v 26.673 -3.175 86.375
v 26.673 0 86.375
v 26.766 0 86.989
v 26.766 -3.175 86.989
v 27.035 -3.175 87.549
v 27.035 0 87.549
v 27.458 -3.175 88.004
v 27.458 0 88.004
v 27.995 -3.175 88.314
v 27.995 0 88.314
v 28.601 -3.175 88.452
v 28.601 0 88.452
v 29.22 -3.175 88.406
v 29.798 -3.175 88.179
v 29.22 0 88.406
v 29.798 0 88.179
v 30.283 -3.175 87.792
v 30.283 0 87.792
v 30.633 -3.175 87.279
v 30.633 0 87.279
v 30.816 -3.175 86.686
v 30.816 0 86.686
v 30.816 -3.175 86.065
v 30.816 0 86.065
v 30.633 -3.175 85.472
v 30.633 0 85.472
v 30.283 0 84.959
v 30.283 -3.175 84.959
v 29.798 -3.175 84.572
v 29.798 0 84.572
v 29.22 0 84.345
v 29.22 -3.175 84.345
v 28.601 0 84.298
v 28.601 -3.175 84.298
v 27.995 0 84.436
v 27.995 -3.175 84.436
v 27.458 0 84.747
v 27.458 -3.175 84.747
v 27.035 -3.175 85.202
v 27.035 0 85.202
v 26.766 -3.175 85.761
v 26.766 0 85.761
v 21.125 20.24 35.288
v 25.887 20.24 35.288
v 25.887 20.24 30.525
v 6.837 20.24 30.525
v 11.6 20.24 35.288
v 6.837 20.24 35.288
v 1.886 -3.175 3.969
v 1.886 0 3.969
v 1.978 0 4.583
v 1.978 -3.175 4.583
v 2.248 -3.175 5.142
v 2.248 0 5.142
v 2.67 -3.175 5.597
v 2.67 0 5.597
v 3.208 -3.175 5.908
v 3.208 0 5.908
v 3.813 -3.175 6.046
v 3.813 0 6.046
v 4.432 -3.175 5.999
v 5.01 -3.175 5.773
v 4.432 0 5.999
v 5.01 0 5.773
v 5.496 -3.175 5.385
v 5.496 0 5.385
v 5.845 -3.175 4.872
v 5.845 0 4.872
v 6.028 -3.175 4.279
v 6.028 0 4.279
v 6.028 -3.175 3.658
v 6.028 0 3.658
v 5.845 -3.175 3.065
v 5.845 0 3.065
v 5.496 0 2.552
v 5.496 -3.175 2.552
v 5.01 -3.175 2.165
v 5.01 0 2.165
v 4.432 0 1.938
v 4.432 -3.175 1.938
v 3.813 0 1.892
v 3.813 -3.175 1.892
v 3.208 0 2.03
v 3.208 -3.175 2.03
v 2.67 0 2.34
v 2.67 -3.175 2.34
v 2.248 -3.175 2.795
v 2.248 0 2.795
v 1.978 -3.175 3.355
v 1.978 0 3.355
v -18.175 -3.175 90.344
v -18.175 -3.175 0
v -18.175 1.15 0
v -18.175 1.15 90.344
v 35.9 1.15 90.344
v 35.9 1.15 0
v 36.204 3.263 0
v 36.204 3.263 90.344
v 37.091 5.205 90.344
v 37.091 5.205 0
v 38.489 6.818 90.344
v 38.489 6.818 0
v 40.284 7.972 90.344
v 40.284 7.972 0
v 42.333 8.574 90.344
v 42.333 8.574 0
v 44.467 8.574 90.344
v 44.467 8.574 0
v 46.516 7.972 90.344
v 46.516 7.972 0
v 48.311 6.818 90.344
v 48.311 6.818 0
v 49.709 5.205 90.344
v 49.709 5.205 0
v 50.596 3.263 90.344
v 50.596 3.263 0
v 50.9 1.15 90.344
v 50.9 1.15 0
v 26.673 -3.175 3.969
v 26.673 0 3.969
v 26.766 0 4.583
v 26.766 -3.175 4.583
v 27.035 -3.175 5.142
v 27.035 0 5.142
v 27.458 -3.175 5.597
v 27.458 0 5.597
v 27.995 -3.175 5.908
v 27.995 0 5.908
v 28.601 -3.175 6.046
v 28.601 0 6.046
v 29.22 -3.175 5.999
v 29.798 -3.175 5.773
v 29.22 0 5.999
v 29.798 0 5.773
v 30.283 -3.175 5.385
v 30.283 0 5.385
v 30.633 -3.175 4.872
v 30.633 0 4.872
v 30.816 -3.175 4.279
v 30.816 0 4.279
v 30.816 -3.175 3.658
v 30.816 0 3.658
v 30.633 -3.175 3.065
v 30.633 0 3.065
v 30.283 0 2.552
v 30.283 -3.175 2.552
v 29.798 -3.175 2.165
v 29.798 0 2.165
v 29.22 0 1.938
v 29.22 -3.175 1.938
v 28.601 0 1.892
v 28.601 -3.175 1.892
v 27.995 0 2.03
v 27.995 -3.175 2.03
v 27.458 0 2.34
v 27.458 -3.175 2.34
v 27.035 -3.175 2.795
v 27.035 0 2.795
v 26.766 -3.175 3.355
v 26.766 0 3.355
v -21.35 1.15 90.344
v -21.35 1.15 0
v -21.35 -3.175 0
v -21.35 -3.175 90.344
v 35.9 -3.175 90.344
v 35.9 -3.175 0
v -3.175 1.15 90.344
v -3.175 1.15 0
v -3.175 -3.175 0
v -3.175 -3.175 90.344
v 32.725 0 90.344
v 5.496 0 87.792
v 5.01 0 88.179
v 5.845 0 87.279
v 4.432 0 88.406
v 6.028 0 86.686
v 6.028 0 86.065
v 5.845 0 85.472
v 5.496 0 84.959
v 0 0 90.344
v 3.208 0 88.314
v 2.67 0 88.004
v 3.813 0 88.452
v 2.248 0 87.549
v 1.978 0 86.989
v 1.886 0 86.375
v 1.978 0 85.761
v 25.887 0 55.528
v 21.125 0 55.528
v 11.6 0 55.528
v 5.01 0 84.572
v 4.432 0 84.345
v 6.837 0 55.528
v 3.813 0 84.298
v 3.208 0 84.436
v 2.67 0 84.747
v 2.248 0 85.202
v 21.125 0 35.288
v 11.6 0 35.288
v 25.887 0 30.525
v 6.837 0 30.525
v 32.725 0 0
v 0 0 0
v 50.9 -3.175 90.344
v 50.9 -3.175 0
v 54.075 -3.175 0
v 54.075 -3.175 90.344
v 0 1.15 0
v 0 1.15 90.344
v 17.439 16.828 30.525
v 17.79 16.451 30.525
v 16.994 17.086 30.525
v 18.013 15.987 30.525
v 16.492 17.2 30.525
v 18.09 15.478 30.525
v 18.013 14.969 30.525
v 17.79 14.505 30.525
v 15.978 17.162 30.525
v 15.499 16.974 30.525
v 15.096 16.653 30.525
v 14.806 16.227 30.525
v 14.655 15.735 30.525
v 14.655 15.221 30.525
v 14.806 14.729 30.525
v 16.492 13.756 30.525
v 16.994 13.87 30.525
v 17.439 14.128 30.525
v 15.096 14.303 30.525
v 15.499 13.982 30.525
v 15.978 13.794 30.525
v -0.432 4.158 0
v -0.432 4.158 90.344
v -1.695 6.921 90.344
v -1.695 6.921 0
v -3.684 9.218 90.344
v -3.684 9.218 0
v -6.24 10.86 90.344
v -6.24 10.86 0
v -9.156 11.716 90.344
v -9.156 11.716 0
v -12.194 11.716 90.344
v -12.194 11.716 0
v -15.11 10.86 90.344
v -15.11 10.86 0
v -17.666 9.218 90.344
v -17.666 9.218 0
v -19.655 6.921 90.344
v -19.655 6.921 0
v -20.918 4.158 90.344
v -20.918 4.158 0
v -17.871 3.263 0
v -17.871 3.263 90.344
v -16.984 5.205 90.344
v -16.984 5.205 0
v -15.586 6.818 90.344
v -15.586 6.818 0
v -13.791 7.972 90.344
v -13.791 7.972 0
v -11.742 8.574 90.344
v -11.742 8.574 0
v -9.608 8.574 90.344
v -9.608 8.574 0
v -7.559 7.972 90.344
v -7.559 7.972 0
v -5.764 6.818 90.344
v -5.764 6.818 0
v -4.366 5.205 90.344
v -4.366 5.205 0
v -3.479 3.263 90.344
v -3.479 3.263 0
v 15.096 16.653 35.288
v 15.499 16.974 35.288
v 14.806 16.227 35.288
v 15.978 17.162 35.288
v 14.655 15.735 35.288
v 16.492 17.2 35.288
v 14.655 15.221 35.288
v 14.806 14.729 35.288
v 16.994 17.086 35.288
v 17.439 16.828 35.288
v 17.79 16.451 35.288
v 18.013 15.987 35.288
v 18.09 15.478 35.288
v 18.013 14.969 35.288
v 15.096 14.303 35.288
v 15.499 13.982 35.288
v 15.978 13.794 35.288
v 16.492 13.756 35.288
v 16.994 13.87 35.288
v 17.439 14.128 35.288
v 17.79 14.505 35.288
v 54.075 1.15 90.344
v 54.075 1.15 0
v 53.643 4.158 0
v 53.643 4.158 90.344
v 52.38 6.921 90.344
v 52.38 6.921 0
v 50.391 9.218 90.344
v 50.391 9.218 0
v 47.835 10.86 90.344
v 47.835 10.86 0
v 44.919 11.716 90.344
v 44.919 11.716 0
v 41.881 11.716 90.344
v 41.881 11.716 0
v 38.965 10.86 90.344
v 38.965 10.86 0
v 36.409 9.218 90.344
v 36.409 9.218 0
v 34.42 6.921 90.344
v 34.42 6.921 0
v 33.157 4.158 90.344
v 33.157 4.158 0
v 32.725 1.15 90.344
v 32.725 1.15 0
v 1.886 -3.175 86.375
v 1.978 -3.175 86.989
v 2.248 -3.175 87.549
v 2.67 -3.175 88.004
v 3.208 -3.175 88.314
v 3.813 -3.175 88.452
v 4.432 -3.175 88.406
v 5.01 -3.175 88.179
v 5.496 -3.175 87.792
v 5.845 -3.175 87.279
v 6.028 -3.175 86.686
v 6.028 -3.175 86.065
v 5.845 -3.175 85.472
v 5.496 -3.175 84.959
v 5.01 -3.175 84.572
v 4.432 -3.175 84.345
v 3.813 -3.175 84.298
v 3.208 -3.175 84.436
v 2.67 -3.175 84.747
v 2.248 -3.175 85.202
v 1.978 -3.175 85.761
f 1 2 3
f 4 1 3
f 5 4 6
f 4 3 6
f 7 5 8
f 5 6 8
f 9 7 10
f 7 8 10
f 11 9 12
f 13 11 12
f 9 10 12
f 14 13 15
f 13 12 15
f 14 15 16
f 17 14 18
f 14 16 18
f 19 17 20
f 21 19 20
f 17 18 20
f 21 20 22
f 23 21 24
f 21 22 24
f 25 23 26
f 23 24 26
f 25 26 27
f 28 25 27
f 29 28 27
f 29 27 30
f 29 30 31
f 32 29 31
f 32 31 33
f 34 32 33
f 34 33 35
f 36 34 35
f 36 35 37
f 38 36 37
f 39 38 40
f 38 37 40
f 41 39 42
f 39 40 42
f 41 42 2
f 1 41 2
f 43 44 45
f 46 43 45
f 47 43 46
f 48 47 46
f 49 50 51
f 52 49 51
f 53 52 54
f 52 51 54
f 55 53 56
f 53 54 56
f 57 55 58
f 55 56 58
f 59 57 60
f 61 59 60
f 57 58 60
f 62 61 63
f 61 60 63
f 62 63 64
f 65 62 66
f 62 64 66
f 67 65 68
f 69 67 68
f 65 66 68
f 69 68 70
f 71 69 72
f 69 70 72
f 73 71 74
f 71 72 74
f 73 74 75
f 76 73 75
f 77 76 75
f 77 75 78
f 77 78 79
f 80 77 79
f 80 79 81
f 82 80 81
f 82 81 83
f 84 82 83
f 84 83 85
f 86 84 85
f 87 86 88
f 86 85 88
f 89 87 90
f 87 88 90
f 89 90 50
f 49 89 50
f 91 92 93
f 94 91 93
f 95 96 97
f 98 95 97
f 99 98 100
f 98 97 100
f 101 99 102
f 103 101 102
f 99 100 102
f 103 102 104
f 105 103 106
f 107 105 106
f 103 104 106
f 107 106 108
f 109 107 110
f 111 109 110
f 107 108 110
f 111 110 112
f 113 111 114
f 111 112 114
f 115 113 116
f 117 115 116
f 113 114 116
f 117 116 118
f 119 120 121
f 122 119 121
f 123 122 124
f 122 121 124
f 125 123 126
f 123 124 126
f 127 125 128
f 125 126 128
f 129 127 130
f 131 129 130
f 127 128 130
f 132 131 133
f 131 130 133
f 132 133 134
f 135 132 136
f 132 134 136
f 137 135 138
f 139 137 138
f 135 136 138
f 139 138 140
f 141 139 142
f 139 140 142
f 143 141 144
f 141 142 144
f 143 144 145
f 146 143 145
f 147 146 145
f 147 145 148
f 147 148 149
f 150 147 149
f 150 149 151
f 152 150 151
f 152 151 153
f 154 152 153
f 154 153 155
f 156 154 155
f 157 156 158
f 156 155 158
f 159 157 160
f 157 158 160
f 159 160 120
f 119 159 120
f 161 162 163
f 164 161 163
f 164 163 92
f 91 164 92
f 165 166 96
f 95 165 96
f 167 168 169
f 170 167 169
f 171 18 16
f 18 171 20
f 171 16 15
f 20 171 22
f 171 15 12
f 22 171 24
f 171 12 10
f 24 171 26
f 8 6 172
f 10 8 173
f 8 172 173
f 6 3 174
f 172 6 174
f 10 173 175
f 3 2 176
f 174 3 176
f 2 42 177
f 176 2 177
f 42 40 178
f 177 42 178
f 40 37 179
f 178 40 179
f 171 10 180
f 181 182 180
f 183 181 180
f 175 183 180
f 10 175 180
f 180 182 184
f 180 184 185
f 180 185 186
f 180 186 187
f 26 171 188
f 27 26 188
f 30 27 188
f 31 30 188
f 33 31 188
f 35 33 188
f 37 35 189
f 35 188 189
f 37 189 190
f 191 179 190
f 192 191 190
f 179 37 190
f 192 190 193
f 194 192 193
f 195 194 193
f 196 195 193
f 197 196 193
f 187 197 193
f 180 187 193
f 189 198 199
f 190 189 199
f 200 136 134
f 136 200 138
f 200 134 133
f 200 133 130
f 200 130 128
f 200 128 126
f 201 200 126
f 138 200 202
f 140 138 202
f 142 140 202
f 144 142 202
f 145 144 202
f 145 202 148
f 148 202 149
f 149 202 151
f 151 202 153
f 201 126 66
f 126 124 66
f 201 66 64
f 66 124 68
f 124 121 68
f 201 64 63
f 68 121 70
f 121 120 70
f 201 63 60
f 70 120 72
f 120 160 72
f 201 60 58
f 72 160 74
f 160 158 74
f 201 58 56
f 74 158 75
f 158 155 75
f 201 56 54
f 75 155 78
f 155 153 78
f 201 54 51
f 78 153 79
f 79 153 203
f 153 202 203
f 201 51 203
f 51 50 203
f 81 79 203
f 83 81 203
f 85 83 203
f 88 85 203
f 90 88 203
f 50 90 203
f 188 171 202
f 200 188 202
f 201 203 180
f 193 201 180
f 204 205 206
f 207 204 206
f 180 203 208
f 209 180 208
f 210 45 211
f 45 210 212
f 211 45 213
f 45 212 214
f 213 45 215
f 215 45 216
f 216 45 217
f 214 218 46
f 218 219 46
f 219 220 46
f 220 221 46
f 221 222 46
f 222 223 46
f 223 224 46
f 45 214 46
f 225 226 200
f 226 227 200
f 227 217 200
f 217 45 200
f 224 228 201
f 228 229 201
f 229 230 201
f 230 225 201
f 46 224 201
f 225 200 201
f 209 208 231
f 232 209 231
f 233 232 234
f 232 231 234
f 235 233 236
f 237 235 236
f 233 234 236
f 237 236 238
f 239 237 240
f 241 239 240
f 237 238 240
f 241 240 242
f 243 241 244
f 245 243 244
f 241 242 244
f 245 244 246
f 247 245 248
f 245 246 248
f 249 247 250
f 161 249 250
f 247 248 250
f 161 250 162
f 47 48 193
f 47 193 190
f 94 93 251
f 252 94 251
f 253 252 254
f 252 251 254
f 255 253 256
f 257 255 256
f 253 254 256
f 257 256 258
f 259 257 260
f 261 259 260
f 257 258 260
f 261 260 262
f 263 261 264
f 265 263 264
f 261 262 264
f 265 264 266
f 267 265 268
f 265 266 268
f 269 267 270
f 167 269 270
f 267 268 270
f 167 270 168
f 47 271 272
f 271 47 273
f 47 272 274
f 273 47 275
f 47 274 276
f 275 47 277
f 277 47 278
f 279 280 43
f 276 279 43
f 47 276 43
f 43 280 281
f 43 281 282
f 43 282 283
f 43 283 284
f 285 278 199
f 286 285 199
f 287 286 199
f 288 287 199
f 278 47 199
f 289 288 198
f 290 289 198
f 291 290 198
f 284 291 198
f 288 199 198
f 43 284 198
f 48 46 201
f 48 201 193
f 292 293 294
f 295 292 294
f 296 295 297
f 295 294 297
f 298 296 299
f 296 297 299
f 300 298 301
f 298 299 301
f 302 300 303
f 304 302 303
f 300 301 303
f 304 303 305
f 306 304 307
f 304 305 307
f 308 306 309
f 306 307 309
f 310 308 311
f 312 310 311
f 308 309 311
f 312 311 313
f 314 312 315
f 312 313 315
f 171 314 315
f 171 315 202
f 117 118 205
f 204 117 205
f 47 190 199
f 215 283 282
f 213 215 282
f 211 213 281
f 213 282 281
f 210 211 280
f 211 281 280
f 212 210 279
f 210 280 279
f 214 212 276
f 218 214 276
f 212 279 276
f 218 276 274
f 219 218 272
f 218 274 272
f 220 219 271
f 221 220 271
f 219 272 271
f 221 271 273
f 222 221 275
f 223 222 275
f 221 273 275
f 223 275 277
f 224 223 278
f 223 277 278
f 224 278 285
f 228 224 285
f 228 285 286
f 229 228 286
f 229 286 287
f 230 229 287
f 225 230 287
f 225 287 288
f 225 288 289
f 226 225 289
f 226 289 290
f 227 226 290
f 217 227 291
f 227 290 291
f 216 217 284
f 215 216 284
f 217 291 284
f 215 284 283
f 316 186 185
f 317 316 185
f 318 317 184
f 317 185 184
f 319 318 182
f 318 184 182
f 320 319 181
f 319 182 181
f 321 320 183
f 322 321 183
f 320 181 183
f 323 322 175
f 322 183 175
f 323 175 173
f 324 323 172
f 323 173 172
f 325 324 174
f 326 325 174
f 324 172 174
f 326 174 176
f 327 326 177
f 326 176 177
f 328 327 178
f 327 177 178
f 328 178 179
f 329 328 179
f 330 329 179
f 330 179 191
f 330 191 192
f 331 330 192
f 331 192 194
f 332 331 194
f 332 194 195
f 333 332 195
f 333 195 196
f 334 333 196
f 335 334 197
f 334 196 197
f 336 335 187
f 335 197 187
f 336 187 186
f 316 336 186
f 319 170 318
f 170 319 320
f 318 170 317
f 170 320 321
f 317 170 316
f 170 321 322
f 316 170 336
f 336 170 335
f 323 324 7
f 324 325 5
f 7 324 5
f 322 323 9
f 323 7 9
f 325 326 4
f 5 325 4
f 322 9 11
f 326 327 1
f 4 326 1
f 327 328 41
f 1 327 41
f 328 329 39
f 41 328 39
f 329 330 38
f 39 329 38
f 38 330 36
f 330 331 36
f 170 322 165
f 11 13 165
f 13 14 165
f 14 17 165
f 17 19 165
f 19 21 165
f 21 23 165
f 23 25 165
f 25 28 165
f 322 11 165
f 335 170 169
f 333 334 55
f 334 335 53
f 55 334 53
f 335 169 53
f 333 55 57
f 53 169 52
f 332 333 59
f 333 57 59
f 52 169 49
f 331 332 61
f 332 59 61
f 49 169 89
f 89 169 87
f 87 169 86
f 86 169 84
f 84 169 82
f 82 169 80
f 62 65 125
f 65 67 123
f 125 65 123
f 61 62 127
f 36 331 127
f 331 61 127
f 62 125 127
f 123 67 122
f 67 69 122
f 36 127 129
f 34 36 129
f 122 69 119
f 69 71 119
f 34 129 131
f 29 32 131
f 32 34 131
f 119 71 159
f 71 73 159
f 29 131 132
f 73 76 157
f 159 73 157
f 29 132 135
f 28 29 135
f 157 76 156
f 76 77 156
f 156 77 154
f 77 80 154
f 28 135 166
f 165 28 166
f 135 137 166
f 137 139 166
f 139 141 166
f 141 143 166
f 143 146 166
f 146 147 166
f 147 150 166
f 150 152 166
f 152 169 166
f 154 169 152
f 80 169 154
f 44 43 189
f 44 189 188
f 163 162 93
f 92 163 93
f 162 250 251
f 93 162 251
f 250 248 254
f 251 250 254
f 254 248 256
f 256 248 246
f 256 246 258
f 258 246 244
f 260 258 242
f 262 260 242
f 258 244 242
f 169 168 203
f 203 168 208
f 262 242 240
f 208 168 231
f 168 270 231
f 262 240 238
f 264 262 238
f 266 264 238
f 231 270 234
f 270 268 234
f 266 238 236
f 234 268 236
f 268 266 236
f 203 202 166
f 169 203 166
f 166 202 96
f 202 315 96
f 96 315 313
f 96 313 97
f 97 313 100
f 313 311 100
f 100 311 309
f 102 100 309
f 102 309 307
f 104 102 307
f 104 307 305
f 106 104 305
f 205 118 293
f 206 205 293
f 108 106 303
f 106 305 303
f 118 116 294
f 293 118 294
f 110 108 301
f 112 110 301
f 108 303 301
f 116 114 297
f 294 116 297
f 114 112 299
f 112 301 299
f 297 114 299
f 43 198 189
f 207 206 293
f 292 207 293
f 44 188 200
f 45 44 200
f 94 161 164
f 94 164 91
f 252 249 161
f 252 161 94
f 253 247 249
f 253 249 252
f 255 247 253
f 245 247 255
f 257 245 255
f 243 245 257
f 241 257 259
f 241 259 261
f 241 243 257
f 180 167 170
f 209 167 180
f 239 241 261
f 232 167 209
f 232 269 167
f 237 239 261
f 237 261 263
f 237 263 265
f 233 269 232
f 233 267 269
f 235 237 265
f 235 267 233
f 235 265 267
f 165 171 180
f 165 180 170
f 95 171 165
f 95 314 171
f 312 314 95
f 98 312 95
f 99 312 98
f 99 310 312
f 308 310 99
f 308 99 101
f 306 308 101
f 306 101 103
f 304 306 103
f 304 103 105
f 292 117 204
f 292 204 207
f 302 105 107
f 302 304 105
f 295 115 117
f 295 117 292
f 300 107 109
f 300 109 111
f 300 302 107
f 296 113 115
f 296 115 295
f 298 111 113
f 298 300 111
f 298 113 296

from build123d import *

# Parameters (mm, degrees)
F1_DEPTH = 90.3440154
F2_R     = 2.0828
F3_DEPTH = 3.175
F5_DEPTH = 20.240498
F6_SIZE  = 20.240488
F7_R     = 1.7272
F8_DEPTH = 4.7625


# Not quite as in the source:
# - a fillet or chamfer is up to 0.001 mm smaller than in the source, because OpenCascade refuses the exact size


with BuildPart() as f1:
    # F0 (on Top) → F1 (new body)
    with BuildSketch(Plane.XY):
        with BuildLine():
            Line((32.7249998, 0), (0, 0))
            Line((0, 0), (0, 1.1500104))
            ThreePointArc((0, 1.1500104), (-10.675, 11.8250104), (-21.35, 1.1500104))
            Line((-21.35, 1.1500104), (-21.35, -3.175))
            Line((-21.35, -3.175), (-18.175, -3.175))
            Line((-18.175, -3.175), (-18.175, 1.1500104))
            ThreePointArc((-18.175, 1.1500104), (-10.675, 8.6500104), (-3.175, 1.1500104))
            Line((-3.175, 1.1500104), (-3.175, -3.175))
            Line((-3.175, -3.175), (35.8999998, -3.175))
            Line((35.8999998, -3.175), (35.8999998, 1.1500104))
            ThreePointArc((35.8999998, 1.1500104), (43.3999998, 8.6500104), (50.8999998, 1.1500104))
            Line((50.8999998, 1.1500104), (50.8999998, -3.175))
            Line((50.8999998, -3.175), (54.0749998, -3.175))
            Line((54.0749998, -3.175), (54.0749998, 1.1500104))
            ThreePointArc((54.0749998, 1.1500104), (43.3999998, 11.8250104), (32.7249998, 1.1500104))
            Line((32.7249998, 1.1500104), (32.7249998, 0))
        make_face()
    extrude(amount=F1_DEPTH)

    # F2 (on face) → F3 (cut, through all)
    with BuildSketch(Plane(origin=(0, 0, 0), x_dir=(-1, 0, 0), z_dir=(0, 1, 0))):
        with Locations((-3.96875, 3.96875)):
            Circle(F2_R)
        with Locations((-28.7562498, 3.96875)):
            Circle(F2_R)
        with Locations((-28.7562498, 86.3752654)):
            Circle(F2_R)
        with Locations((-3.96875, 86.3752654)):
            Circle(F2_R)
    extrude(amount=-F3_DEPTH, mode=Mode.SUBTRACT)

    # F4 (on face) → F5 (join)
    with BuildSketch(Plane(origin=(0, 0, 0), x_dir=(-1, 0, 0), z_dir=(0, 1, 0))):
        Polygon((-25.8874999, 55.52801188), (-25.8874999, 30.52501388), (-6.8374999, 30.52501388), (-6.8374999, 55.52801188), (-11.5999999, 55.52801188), (-11.5999999, 35.28751388), (-21.1249999, 35.28751388), (-21.1249999, 55.52801188), align=None)
    extrude(amount=F5_DEPTH)

    # F6 (size 20.240498 in the source; OpenCascade refuses exactly that, so slightly less here)
    f6_edges = [f1.edges().sort_by_distance(p)[0] for p in [
        (23.50625, 20.240498, 55.528012),
        (9.21875, 20.240498, 55.528012),
    ]]
    chamfer(f6_edges, length=F6_SIZE)

    # F7 (on face) → F8 (cut, through all)
    with BuildSketch(Plane.XY.offset(35.28751388)):
        with Locations((16.3624999, 15.477998)):
            Circle(F7_R)
    extrude(amount=-F8_DEPTH, mode=Mode.SUBTRACT)


solid = f1.part
